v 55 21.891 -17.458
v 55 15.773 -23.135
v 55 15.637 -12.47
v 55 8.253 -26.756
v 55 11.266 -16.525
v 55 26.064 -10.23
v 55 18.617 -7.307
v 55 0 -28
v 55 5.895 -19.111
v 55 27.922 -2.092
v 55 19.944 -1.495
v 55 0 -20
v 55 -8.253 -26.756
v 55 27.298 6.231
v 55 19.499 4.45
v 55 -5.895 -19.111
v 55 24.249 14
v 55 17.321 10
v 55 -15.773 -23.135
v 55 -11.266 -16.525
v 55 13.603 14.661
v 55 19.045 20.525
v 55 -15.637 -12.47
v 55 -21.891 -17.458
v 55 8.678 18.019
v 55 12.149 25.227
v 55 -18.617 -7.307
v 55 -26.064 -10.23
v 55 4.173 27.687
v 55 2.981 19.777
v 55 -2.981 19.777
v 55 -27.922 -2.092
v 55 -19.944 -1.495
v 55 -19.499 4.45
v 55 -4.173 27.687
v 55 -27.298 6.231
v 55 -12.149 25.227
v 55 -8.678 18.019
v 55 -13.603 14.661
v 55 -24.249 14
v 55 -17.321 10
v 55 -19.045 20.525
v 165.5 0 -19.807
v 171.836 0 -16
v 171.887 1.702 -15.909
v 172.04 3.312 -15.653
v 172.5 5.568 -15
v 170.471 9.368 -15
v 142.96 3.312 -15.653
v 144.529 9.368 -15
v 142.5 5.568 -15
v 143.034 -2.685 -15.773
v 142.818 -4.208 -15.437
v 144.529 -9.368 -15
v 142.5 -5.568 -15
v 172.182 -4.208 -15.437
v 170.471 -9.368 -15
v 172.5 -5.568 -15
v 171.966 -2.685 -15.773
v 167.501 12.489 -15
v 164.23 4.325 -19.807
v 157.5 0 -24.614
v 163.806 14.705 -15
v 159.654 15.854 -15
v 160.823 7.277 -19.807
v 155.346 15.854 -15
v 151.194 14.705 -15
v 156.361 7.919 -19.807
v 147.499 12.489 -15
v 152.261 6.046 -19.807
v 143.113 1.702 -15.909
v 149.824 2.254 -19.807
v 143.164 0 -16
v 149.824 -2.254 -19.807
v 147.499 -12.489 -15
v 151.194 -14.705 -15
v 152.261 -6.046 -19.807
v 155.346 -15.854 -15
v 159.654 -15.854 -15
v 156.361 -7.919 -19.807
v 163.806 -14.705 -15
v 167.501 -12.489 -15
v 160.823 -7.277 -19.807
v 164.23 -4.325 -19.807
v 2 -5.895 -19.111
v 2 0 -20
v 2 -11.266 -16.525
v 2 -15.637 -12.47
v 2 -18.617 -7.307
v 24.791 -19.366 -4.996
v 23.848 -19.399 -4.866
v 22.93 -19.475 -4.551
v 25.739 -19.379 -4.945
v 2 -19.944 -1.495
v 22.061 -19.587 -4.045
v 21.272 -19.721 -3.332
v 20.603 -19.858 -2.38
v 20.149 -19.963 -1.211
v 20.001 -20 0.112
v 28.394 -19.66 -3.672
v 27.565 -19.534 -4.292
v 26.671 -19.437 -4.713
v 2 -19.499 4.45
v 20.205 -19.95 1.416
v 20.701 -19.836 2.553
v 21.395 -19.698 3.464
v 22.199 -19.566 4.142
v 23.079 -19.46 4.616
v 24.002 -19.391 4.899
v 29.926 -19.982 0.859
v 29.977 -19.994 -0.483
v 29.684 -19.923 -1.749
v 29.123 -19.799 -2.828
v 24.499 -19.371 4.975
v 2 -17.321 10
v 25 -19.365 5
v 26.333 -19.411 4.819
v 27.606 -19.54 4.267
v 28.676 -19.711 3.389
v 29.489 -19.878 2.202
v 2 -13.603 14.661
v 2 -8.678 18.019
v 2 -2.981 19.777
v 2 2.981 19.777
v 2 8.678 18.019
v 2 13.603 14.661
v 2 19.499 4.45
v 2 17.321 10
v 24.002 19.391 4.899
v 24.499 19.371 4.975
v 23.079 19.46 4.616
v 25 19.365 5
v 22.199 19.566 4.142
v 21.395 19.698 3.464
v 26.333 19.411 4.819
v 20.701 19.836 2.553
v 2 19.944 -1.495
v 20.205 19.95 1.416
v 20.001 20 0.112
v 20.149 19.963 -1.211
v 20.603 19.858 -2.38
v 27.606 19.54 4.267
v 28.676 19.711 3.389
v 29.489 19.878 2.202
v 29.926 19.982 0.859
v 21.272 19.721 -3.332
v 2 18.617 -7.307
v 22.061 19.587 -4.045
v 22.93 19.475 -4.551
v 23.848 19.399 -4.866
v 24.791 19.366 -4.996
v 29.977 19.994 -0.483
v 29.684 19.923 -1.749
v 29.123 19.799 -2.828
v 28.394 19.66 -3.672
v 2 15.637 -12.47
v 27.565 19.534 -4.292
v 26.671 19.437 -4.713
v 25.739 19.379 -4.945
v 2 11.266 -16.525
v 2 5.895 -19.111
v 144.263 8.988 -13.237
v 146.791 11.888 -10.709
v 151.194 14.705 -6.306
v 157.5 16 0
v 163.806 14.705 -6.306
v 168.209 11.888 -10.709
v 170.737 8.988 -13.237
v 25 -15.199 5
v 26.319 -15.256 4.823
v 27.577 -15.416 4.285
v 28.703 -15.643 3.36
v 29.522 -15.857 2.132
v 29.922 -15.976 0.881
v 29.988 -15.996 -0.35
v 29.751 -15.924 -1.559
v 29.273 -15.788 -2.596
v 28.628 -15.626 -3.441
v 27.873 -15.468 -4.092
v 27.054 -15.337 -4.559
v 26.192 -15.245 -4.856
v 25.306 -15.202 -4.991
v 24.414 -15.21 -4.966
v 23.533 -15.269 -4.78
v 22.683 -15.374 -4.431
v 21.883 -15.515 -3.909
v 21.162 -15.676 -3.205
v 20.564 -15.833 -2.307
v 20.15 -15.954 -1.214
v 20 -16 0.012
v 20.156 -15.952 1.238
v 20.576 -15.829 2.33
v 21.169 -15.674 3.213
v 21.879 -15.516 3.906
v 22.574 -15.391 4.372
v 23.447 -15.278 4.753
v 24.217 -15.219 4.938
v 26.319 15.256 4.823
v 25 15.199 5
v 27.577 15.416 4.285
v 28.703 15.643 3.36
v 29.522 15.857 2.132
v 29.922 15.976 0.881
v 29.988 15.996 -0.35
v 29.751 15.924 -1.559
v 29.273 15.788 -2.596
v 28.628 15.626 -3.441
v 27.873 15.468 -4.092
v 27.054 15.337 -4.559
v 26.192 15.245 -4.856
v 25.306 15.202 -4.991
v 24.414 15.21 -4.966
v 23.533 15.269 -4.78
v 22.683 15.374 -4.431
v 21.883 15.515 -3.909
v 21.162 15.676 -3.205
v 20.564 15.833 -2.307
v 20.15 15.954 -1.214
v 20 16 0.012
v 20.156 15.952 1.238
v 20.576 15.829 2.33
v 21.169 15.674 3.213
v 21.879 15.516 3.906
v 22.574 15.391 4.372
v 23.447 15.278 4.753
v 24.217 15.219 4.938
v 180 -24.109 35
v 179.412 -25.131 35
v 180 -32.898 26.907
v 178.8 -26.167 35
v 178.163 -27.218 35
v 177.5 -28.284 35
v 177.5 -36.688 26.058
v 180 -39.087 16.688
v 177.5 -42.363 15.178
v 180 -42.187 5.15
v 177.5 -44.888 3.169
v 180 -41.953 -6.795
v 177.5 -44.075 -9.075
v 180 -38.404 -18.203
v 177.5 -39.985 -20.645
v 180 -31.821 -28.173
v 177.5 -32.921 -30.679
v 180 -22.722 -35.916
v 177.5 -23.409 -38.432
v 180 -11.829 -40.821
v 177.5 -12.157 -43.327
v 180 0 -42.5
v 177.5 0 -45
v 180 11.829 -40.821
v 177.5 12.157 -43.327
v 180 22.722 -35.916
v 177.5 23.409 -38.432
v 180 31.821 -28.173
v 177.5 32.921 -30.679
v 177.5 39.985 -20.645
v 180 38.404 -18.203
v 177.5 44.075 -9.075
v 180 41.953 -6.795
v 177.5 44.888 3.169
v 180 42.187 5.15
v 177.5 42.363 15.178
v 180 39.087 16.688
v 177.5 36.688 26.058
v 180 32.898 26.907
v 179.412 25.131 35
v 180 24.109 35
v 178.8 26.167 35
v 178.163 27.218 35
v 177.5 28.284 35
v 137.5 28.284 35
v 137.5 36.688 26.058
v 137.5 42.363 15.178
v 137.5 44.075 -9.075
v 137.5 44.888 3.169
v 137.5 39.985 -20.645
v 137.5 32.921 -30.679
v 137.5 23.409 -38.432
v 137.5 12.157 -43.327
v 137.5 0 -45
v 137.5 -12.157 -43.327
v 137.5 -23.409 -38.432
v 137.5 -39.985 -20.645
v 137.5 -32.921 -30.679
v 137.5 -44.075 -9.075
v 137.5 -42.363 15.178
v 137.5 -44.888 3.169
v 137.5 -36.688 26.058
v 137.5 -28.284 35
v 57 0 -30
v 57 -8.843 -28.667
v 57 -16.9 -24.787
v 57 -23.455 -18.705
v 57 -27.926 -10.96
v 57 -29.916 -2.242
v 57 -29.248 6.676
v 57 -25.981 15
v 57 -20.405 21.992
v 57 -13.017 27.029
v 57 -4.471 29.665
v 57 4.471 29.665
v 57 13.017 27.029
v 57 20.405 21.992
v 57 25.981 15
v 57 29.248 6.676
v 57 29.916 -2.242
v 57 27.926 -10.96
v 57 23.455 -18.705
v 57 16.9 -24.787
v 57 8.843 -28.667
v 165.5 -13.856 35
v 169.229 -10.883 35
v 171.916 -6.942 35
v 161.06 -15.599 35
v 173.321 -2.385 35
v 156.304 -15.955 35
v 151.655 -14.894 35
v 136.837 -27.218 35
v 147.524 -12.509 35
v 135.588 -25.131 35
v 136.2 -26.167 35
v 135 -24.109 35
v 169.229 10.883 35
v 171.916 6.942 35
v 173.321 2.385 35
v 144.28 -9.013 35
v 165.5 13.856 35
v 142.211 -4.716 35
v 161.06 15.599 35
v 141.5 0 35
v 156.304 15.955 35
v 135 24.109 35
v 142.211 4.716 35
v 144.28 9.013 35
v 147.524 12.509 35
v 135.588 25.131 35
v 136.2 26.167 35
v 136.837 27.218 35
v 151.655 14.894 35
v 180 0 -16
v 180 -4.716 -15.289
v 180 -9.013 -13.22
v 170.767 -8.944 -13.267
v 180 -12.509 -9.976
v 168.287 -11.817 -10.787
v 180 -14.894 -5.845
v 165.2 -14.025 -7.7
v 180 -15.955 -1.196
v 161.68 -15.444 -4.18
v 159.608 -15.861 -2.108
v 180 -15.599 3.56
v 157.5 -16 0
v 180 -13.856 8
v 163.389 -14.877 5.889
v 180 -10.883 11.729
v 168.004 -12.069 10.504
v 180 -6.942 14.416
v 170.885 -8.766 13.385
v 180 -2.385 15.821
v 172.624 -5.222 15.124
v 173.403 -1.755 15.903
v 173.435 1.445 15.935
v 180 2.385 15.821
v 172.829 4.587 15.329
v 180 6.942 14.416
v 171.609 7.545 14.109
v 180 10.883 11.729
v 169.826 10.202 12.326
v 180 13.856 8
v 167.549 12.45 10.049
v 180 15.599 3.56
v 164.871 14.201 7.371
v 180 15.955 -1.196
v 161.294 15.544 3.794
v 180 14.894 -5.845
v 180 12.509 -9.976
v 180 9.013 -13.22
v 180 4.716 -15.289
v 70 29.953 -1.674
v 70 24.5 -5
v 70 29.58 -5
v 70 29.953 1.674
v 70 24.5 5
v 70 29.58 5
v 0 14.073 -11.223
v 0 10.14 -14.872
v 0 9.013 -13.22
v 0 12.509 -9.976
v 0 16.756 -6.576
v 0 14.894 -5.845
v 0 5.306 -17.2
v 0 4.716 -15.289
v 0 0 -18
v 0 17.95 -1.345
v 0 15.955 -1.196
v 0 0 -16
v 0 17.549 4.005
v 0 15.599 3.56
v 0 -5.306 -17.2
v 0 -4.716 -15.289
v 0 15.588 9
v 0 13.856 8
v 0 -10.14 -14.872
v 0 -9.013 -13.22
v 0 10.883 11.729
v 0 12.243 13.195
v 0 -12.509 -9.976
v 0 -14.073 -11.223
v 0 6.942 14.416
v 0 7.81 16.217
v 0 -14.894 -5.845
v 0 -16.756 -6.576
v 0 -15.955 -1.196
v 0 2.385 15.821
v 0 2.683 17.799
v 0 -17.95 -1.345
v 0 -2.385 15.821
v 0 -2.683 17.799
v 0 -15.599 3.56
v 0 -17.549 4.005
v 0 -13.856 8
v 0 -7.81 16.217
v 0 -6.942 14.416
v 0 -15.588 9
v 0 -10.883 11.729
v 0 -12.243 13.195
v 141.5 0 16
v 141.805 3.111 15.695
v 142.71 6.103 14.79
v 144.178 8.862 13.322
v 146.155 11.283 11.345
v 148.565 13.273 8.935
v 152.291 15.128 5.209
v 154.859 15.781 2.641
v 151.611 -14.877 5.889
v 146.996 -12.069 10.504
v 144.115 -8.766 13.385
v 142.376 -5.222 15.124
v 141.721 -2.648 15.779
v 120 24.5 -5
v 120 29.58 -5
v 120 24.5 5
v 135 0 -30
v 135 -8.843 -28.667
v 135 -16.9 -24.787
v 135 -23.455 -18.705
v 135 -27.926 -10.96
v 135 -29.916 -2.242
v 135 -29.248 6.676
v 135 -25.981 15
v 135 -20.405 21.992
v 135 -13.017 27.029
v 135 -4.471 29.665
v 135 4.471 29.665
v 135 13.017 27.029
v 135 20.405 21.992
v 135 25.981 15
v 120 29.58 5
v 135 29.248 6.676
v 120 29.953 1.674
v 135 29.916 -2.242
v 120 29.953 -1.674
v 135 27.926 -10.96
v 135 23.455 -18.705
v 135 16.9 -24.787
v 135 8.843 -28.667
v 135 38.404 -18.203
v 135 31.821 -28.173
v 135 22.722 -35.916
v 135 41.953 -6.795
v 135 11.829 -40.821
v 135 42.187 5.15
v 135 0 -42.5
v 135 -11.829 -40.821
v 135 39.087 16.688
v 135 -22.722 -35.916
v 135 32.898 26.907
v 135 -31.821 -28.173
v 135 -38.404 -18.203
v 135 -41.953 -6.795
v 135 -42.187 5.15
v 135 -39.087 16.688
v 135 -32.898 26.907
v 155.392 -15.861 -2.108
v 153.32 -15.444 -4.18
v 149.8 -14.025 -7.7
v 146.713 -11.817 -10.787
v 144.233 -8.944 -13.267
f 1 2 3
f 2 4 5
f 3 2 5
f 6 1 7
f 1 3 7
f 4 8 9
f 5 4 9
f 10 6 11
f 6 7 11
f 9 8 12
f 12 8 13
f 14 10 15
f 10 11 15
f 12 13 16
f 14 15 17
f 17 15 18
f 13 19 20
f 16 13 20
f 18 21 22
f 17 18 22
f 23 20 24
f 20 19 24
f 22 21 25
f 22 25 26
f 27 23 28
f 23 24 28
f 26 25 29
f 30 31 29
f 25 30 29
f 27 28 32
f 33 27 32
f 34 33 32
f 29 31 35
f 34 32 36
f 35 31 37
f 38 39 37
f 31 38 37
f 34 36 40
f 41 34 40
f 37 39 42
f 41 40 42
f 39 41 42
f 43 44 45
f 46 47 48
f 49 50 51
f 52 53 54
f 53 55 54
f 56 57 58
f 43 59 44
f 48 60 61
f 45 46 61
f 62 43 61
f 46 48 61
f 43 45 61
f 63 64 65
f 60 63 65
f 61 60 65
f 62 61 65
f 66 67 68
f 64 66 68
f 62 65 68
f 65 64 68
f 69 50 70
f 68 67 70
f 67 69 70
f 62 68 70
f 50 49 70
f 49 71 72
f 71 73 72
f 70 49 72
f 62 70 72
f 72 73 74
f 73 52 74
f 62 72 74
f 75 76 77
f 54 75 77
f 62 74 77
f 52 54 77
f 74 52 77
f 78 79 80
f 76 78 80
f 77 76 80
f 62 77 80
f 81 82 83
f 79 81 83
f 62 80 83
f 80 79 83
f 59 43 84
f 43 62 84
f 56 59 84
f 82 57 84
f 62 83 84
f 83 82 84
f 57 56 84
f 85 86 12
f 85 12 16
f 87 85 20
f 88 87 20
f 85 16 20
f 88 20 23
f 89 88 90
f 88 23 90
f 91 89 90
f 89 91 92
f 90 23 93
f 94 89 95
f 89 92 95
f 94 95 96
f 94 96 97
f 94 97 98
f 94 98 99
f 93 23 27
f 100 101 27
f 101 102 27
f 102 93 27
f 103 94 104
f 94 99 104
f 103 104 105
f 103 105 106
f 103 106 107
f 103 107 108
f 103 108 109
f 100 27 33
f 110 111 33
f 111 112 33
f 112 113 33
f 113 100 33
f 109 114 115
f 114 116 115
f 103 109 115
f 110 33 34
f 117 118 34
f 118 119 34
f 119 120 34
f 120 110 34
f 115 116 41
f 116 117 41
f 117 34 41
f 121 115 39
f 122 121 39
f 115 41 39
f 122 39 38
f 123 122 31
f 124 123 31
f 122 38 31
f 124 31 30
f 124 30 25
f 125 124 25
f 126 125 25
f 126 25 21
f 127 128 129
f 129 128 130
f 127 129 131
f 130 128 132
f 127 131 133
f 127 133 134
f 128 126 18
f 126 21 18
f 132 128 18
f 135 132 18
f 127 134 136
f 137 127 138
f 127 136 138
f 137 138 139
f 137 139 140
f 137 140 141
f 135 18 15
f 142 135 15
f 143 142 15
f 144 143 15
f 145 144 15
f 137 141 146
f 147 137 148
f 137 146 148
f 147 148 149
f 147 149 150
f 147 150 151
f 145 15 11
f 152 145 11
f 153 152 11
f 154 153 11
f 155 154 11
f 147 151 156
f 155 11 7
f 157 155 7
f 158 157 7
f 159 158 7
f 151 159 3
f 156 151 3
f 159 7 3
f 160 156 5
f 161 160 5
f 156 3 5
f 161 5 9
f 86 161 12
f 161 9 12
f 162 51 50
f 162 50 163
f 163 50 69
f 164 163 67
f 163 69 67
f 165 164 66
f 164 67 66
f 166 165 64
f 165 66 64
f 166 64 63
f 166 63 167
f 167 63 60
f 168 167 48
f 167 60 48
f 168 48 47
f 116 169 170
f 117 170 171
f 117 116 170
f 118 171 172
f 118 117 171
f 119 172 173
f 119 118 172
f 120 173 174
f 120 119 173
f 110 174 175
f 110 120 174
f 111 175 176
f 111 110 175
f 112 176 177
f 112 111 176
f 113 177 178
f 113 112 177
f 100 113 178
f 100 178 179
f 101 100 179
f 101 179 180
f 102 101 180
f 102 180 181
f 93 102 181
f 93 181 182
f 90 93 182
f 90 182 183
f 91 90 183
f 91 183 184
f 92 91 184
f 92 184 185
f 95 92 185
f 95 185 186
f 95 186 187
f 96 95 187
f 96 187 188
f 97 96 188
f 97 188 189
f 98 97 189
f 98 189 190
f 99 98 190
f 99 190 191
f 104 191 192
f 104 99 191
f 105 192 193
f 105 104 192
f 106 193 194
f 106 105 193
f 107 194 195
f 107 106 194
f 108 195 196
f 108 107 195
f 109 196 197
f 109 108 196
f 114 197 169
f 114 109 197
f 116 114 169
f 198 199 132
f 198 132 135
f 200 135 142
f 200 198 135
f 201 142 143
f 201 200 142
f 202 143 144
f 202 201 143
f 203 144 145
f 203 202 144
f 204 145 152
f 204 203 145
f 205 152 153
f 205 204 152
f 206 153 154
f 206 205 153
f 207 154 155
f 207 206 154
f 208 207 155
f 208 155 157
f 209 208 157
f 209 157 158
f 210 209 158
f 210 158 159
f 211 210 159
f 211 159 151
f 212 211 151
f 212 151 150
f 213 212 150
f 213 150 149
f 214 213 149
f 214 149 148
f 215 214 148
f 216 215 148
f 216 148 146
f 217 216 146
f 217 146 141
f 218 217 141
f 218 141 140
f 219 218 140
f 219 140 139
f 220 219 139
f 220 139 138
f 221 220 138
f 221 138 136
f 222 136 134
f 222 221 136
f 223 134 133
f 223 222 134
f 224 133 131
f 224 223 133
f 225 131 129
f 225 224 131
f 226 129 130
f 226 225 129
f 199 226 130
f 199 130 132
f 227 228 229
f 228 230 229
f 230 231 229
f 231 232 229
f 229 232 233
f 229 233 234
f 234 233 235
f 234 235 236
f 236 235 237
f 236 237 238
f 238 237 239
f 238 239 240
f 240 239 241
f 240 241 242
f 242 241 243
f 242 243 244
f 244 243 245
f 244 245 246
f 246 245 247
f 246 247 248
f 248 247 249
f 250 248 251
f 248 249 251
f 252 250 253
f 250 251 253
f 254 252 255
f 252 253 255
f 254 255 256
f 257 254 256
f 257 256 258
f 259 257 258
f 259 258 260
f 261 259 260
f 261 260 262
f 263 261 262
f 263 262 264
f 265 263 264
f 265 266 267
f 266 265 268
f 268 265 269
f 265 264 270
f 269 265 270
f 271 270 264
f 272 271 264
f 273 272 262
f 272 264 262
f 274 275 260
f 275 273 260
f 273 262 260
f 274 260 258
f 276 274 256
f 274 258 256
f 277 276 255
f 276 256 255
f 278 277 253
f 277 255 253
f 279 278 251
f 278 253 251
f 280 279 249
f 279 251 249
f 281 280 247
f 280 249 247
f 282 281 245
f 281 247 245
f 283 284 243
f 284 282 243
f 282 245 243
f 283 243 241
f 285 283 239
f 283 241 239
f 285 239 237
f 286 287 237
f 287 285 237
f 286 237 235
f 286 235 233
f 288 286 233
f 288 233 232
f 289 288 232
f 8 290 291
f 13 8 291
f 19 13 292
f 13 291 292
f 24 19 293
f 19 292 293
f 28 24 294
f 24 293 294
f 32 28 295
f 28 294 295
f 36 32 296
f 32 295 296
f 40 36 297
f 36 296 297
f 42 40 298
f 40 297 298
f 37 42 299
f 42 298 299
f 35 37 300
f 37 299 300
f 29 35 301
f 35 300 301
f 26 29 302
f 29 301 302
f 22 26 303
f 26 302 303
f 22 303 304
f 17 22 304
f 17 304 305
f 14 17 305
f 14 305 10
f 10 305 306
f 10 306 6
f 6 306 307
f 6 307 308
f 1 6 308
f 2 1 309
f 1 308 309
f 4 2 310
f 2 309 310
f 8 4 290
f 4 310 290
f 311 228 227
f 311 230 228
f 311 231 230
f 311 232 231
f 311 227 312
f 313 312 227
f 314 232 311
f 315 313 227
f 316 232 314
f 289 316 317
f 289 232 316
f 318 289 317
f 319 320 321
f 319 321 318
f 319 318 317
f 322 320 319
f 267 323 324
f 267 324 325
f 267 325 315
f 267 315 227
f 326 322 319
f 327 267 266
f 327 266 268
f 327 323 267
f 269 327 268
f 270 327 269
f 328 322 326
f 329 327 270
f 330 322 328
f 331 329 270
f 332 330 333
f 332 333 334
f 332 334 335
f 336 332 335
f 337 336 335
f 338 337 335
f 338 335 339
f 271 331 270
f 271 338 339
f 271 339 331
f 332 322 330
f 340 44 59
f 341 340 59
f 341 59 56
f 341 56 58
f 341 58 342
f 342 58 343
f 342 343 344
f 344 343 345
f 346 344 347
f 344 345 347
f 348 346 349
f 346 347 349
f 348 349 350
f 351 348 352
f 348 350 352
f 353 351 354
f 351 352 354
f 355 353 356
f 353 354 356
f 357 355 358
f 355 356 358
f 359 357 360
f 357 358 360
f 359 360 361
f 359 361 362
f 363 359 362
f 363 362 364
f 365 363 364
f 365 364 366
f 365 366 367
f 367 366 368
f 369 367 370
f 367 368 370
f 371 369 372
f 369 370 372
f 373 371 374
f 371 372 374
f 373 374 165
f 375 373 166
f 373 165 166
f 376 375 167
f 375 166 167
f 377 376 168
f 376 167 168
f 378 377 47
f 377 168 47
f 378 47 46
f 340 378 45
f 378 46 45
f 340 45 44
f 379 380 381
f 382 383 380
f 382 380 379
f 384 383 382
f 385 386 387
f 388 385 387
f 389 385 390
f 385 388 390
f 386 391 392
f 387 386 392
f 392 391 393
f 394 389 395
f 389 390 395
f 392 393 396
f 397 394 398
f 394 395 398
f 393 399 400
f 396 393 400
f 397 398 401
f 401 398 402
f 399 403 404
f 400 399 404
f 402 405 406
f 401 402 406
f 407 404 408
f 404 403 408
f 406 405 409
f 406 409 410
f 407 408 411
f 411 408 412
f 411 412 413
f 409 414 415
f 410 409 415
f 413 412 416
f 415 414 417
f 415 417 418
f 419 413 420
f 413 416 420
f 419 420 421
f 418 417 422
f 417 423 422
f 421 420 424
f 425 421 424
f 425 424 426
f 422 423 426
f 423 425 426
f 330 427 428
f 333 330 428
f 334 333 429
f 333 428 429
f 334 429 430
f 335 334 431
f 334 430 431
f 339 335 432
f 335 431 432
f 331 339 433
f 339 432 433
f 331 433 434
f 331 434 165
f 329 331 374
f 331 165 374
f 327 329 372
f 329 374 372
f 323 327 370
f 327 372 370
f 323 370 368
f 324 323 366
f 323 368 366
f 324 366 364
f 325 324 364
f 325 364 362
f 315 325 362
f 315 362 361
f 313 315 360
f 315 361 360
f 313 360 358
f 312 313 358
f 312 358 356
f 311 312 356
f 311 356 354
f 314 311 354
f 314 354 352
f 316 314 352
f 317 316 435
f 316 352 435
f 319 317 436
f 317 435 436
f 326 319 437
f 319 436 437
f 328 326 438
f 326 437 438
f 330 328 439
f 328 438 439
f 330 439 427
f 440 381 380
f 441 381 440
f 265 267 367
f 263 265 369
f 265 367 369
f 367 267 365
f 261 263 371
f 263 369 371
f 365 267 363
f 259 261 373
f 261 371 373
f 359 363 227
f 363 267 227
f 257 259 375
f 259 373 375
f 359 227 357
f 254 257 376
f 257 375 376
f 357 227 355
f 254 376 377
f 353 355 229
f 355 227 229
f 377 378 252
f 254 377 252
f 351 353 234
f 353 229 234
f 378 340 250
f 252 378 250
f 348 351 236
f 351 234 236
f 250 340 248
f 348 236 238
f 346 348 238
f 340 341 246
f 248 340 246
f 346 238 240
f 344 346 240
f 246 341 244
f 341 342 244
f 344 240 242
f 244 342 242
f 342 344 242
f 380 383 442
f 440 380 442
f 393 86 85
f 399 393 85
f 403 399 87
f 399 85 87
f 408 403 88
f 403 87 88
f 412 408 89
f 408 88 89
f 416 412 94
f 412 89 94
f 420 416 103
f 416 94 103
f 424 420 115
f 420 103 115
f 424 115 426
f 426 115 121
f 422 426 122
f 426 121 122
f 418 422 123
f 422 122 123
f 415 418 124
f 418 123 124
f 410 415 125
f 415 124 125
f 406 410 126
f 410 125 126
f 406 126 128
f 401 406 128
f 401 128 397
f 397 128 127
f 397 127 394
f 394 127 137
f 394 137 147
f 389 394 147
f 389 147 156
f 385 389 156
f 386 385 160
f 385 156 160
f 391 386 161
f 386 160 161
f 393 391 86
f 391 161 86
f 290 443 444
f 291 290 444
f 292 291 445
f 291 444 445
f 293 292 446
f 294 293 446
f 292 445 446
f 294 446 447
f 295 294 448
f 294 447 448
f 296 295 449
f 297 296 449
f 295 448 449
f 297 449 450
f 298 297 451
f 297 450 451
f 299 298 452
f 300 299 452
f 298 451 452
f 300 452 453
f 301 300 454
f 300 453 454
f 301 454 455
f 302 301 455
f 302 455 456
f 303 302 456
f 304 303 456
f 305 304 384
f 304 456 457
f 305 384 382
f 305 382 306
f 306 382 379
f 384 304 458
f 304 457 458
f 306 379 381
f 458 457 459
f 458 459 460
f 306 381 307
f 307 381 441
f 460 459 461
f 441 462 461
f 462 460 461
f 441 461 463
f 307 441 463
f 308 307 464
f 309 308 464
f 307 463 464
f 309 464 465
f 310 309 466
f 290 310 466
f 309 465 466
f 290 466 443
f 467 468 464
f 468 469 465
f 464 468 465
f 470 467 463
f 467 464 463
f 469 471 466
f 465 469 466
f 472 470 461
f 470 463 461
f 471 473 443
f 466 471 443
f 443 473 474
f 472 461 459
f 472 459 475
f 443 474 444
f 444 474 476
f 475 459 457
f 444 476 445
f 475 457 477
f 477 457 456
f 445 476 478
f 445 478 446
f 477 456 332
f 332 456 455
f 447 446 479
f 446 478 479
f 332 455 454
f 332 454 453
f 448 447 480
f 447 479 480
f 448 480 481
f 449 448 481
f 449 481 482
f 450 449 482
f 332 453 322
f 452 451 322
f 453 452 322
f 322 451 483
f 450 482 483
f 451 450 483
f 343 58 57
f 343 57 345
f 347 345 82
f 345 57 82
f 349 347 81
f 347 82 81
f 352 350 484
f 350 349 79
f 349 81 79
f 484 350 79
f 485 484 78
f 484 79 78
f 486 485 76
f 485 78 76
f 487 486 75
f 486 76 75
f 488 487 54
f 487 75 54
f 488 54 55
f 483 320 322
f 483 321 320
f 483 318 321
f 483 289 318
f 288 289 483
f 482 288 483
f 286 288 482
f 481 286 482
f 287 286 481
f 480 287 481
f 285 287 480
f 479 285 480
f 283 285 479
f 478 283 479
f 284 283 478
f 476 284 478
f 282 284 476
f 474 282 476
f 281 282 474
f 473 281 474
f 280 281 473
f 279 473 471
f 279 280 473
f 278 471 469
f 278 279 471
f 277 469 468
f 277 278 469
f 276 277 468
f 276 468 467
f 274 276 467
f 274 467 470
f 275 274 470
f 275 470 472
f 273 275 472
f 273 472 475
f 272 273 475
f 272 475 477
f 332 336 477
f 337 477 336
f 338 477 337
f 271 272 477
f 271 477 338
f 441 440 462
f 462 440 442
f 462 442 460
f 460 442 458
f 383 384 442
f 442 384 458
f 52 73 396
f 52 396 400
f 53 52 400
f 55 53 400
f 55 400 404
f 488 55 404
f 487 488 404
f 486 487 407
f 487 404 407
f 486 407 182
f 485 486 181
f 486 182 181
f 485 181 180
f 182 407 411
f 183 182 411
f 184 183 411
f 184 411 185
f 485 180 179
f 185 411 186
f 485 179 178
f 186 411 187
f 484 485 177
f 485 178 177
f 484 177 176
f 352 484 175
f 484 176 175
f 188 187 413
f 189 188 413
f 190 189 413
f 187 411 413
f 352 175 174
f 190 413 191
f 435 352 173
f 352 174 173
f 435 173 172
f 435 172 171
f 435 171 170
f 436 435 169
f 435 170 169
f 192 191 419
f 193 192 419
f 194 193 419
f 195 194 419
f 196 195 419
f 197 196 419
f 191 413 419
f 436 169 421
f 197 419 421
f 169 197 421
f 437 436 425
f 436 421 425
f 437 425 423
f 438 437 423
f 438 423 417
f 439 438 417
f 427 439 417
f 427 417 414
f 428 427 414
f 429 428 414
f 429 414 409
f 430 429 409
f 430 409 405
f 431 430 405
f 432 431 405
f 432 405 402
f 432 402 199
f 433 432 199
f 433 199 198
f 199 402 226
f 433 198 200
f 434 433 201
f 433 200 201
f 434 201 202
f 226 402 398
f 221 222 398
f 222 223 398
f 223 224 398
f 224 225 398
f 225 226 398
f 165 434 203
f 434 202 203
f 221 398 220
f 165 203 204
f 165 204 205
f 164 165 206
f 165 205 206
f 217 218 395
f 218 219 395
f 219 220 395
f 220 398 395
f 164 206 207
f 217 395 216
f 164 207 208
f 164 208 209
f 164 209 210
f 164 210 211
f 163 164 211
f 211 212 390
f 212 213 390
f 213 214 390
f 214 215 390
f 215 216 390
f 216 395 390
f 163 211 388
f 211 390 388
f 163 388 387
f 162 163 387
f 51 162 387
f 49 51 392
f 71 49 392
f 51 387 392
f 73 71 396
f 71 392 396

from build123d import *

# Parameters (mm, degrees)
CUT_EXTRUDE_9_DEPTH         = 191.91883092
CUT_EXTRUDE_9_DEPTH_BACK    = 191.91883092
SKETCH_6_W                  = 50
SKETCH_6_H                  = 5.5
CUT_EXTRUDE_4_DEPTH         = 5
CUT_EXTRUDE_10_DEPTH        = 191.91883092
CUT_EXTRUDE_10_DEPTH_BACK   = 191.91883092
SKETCH_16_R                 = 5
HOLE_WIZARD_0_15_32_1_D     = 32
HOLE_WIZARD_0_15_32_1_DEPTH = 50
HOLE_WIZARD_0_15_32_1_TIP   = 9.613769904
CHAMFER_3_SIZE              = 2
CHAMFER_4_SIZE              = 2.5


with BuildPart() as part:
    # Эскиз1 → Повернуть1 (revolve)
    with BuildSketch(Plane.XY, mode=Mode.PRIVATE) as revolve_1_sk:
        Polygon((0, 16), (0, 20), (55, 20), (55, 30), (135, 30), (135, 45), (180, 45), (180, 16), align=None)
    revolve(revolve_1_sk.sketch.rotate(Axis((0, 0, 0), (-1, 0, 0)), 90), axis=Axis((0, 0, 0), (-1, 0, 0)))

    # Эскиз15 → Вырез-Вытянуть9 (cut, two sides: drawn at the far end of the back side and taken through both)
    with BuildSketch(Plane(origin=(180, 0, 0), x_dir=(0, 0, -1), z_dir=(1, 0, 0)).offset(-CUT_EXTRUDE_9_DEPTH_BACK)):
        with BuildLine():
            Line((-35, -28.284271247), (-35, 28.284271247))
            ThreePointArc((-35, 28.284271247), (-45, 0), (-35, -28.284271247))
        make_face()
    extrude(amount=CUT_EXTRUDE_9_DEPTH + CUT_EXTRUDE_9_DEPTH_BACK, mode=Mode.SUBTRACT)

    # Эскиз6 → Вырез-Вытянуть4 (cut, symmetric)
    with BuildSketch(Plane.XY):
        with Locations((95, 27.25)):
            Rectangle(SKETCH_6_W, SKETCH_6_H)
    extrude(amount=CUT_EXTRUDE_4_DEPTH, both=True, mode=Mode.SUBTRACT)

    # Эскиз16 → Вырез-Вытянуть10 (cut, two sides: drawn at the far end of the back side and taken through both)
    with BuildSketch(Plane(origin=(0, 0, 0), x_dir=(1, 0, 0), z_dir=(0, 1, 0)).offset(-CUT_EXTRUDE_10_DEPTH_BACK)):
        with Locations(Location((25, 0, 0), (0, 0, 270))):
            Circle(SKETCH_16_R)
    extrude(amount=CUT_EXTRUDE_10_DEPTH + CUT_EXTRUDE_10_DEPTH_BACK, mode=Mode.SUBTRACT)

    # Диаметр отверстия Ø0.15 (32)1
    with Locations(Plane.XY.offset(35)):
        with Locations((157.5, 0)):
            Hole(HOLE_WIZARD_0_15_32_1_D / 2, depth=HOLE_WIZARD_0_15_32_1_DEPTH)
            with Locations((0, 0, -(HOLE_WIZARD_0_15_32_1_DEPTH + HOLE_WIZARD_0_15_32_1_TIP / 2))):  # 118° drill point
                Cone(0, HOLE_WIZARD_0_15_32_1_D / 2, HOLE_WIZARD_0_15_32_1_TIP, mode=Mode.SUBTRACT)

    # Фаска3
    chamfer_3_edges = [part.edges().sort_by_distance(p)[0] for p in [
        (55, 0, 30),
        (0, 0, 20),
    ]]
    chamfer(chamfer_3_edges, length=CHAMFER_3_SIZE)

    # Фаска4
    chamfer_4_edges = [part.edges().sort_by_distance(p)[0] for p in [
        (180, 0, -45),
        (135, 0, -45),
    ]]
    chamfer(chamfer_4_edges, length=CHAMFER_4_SIZE)


solid = part.part
